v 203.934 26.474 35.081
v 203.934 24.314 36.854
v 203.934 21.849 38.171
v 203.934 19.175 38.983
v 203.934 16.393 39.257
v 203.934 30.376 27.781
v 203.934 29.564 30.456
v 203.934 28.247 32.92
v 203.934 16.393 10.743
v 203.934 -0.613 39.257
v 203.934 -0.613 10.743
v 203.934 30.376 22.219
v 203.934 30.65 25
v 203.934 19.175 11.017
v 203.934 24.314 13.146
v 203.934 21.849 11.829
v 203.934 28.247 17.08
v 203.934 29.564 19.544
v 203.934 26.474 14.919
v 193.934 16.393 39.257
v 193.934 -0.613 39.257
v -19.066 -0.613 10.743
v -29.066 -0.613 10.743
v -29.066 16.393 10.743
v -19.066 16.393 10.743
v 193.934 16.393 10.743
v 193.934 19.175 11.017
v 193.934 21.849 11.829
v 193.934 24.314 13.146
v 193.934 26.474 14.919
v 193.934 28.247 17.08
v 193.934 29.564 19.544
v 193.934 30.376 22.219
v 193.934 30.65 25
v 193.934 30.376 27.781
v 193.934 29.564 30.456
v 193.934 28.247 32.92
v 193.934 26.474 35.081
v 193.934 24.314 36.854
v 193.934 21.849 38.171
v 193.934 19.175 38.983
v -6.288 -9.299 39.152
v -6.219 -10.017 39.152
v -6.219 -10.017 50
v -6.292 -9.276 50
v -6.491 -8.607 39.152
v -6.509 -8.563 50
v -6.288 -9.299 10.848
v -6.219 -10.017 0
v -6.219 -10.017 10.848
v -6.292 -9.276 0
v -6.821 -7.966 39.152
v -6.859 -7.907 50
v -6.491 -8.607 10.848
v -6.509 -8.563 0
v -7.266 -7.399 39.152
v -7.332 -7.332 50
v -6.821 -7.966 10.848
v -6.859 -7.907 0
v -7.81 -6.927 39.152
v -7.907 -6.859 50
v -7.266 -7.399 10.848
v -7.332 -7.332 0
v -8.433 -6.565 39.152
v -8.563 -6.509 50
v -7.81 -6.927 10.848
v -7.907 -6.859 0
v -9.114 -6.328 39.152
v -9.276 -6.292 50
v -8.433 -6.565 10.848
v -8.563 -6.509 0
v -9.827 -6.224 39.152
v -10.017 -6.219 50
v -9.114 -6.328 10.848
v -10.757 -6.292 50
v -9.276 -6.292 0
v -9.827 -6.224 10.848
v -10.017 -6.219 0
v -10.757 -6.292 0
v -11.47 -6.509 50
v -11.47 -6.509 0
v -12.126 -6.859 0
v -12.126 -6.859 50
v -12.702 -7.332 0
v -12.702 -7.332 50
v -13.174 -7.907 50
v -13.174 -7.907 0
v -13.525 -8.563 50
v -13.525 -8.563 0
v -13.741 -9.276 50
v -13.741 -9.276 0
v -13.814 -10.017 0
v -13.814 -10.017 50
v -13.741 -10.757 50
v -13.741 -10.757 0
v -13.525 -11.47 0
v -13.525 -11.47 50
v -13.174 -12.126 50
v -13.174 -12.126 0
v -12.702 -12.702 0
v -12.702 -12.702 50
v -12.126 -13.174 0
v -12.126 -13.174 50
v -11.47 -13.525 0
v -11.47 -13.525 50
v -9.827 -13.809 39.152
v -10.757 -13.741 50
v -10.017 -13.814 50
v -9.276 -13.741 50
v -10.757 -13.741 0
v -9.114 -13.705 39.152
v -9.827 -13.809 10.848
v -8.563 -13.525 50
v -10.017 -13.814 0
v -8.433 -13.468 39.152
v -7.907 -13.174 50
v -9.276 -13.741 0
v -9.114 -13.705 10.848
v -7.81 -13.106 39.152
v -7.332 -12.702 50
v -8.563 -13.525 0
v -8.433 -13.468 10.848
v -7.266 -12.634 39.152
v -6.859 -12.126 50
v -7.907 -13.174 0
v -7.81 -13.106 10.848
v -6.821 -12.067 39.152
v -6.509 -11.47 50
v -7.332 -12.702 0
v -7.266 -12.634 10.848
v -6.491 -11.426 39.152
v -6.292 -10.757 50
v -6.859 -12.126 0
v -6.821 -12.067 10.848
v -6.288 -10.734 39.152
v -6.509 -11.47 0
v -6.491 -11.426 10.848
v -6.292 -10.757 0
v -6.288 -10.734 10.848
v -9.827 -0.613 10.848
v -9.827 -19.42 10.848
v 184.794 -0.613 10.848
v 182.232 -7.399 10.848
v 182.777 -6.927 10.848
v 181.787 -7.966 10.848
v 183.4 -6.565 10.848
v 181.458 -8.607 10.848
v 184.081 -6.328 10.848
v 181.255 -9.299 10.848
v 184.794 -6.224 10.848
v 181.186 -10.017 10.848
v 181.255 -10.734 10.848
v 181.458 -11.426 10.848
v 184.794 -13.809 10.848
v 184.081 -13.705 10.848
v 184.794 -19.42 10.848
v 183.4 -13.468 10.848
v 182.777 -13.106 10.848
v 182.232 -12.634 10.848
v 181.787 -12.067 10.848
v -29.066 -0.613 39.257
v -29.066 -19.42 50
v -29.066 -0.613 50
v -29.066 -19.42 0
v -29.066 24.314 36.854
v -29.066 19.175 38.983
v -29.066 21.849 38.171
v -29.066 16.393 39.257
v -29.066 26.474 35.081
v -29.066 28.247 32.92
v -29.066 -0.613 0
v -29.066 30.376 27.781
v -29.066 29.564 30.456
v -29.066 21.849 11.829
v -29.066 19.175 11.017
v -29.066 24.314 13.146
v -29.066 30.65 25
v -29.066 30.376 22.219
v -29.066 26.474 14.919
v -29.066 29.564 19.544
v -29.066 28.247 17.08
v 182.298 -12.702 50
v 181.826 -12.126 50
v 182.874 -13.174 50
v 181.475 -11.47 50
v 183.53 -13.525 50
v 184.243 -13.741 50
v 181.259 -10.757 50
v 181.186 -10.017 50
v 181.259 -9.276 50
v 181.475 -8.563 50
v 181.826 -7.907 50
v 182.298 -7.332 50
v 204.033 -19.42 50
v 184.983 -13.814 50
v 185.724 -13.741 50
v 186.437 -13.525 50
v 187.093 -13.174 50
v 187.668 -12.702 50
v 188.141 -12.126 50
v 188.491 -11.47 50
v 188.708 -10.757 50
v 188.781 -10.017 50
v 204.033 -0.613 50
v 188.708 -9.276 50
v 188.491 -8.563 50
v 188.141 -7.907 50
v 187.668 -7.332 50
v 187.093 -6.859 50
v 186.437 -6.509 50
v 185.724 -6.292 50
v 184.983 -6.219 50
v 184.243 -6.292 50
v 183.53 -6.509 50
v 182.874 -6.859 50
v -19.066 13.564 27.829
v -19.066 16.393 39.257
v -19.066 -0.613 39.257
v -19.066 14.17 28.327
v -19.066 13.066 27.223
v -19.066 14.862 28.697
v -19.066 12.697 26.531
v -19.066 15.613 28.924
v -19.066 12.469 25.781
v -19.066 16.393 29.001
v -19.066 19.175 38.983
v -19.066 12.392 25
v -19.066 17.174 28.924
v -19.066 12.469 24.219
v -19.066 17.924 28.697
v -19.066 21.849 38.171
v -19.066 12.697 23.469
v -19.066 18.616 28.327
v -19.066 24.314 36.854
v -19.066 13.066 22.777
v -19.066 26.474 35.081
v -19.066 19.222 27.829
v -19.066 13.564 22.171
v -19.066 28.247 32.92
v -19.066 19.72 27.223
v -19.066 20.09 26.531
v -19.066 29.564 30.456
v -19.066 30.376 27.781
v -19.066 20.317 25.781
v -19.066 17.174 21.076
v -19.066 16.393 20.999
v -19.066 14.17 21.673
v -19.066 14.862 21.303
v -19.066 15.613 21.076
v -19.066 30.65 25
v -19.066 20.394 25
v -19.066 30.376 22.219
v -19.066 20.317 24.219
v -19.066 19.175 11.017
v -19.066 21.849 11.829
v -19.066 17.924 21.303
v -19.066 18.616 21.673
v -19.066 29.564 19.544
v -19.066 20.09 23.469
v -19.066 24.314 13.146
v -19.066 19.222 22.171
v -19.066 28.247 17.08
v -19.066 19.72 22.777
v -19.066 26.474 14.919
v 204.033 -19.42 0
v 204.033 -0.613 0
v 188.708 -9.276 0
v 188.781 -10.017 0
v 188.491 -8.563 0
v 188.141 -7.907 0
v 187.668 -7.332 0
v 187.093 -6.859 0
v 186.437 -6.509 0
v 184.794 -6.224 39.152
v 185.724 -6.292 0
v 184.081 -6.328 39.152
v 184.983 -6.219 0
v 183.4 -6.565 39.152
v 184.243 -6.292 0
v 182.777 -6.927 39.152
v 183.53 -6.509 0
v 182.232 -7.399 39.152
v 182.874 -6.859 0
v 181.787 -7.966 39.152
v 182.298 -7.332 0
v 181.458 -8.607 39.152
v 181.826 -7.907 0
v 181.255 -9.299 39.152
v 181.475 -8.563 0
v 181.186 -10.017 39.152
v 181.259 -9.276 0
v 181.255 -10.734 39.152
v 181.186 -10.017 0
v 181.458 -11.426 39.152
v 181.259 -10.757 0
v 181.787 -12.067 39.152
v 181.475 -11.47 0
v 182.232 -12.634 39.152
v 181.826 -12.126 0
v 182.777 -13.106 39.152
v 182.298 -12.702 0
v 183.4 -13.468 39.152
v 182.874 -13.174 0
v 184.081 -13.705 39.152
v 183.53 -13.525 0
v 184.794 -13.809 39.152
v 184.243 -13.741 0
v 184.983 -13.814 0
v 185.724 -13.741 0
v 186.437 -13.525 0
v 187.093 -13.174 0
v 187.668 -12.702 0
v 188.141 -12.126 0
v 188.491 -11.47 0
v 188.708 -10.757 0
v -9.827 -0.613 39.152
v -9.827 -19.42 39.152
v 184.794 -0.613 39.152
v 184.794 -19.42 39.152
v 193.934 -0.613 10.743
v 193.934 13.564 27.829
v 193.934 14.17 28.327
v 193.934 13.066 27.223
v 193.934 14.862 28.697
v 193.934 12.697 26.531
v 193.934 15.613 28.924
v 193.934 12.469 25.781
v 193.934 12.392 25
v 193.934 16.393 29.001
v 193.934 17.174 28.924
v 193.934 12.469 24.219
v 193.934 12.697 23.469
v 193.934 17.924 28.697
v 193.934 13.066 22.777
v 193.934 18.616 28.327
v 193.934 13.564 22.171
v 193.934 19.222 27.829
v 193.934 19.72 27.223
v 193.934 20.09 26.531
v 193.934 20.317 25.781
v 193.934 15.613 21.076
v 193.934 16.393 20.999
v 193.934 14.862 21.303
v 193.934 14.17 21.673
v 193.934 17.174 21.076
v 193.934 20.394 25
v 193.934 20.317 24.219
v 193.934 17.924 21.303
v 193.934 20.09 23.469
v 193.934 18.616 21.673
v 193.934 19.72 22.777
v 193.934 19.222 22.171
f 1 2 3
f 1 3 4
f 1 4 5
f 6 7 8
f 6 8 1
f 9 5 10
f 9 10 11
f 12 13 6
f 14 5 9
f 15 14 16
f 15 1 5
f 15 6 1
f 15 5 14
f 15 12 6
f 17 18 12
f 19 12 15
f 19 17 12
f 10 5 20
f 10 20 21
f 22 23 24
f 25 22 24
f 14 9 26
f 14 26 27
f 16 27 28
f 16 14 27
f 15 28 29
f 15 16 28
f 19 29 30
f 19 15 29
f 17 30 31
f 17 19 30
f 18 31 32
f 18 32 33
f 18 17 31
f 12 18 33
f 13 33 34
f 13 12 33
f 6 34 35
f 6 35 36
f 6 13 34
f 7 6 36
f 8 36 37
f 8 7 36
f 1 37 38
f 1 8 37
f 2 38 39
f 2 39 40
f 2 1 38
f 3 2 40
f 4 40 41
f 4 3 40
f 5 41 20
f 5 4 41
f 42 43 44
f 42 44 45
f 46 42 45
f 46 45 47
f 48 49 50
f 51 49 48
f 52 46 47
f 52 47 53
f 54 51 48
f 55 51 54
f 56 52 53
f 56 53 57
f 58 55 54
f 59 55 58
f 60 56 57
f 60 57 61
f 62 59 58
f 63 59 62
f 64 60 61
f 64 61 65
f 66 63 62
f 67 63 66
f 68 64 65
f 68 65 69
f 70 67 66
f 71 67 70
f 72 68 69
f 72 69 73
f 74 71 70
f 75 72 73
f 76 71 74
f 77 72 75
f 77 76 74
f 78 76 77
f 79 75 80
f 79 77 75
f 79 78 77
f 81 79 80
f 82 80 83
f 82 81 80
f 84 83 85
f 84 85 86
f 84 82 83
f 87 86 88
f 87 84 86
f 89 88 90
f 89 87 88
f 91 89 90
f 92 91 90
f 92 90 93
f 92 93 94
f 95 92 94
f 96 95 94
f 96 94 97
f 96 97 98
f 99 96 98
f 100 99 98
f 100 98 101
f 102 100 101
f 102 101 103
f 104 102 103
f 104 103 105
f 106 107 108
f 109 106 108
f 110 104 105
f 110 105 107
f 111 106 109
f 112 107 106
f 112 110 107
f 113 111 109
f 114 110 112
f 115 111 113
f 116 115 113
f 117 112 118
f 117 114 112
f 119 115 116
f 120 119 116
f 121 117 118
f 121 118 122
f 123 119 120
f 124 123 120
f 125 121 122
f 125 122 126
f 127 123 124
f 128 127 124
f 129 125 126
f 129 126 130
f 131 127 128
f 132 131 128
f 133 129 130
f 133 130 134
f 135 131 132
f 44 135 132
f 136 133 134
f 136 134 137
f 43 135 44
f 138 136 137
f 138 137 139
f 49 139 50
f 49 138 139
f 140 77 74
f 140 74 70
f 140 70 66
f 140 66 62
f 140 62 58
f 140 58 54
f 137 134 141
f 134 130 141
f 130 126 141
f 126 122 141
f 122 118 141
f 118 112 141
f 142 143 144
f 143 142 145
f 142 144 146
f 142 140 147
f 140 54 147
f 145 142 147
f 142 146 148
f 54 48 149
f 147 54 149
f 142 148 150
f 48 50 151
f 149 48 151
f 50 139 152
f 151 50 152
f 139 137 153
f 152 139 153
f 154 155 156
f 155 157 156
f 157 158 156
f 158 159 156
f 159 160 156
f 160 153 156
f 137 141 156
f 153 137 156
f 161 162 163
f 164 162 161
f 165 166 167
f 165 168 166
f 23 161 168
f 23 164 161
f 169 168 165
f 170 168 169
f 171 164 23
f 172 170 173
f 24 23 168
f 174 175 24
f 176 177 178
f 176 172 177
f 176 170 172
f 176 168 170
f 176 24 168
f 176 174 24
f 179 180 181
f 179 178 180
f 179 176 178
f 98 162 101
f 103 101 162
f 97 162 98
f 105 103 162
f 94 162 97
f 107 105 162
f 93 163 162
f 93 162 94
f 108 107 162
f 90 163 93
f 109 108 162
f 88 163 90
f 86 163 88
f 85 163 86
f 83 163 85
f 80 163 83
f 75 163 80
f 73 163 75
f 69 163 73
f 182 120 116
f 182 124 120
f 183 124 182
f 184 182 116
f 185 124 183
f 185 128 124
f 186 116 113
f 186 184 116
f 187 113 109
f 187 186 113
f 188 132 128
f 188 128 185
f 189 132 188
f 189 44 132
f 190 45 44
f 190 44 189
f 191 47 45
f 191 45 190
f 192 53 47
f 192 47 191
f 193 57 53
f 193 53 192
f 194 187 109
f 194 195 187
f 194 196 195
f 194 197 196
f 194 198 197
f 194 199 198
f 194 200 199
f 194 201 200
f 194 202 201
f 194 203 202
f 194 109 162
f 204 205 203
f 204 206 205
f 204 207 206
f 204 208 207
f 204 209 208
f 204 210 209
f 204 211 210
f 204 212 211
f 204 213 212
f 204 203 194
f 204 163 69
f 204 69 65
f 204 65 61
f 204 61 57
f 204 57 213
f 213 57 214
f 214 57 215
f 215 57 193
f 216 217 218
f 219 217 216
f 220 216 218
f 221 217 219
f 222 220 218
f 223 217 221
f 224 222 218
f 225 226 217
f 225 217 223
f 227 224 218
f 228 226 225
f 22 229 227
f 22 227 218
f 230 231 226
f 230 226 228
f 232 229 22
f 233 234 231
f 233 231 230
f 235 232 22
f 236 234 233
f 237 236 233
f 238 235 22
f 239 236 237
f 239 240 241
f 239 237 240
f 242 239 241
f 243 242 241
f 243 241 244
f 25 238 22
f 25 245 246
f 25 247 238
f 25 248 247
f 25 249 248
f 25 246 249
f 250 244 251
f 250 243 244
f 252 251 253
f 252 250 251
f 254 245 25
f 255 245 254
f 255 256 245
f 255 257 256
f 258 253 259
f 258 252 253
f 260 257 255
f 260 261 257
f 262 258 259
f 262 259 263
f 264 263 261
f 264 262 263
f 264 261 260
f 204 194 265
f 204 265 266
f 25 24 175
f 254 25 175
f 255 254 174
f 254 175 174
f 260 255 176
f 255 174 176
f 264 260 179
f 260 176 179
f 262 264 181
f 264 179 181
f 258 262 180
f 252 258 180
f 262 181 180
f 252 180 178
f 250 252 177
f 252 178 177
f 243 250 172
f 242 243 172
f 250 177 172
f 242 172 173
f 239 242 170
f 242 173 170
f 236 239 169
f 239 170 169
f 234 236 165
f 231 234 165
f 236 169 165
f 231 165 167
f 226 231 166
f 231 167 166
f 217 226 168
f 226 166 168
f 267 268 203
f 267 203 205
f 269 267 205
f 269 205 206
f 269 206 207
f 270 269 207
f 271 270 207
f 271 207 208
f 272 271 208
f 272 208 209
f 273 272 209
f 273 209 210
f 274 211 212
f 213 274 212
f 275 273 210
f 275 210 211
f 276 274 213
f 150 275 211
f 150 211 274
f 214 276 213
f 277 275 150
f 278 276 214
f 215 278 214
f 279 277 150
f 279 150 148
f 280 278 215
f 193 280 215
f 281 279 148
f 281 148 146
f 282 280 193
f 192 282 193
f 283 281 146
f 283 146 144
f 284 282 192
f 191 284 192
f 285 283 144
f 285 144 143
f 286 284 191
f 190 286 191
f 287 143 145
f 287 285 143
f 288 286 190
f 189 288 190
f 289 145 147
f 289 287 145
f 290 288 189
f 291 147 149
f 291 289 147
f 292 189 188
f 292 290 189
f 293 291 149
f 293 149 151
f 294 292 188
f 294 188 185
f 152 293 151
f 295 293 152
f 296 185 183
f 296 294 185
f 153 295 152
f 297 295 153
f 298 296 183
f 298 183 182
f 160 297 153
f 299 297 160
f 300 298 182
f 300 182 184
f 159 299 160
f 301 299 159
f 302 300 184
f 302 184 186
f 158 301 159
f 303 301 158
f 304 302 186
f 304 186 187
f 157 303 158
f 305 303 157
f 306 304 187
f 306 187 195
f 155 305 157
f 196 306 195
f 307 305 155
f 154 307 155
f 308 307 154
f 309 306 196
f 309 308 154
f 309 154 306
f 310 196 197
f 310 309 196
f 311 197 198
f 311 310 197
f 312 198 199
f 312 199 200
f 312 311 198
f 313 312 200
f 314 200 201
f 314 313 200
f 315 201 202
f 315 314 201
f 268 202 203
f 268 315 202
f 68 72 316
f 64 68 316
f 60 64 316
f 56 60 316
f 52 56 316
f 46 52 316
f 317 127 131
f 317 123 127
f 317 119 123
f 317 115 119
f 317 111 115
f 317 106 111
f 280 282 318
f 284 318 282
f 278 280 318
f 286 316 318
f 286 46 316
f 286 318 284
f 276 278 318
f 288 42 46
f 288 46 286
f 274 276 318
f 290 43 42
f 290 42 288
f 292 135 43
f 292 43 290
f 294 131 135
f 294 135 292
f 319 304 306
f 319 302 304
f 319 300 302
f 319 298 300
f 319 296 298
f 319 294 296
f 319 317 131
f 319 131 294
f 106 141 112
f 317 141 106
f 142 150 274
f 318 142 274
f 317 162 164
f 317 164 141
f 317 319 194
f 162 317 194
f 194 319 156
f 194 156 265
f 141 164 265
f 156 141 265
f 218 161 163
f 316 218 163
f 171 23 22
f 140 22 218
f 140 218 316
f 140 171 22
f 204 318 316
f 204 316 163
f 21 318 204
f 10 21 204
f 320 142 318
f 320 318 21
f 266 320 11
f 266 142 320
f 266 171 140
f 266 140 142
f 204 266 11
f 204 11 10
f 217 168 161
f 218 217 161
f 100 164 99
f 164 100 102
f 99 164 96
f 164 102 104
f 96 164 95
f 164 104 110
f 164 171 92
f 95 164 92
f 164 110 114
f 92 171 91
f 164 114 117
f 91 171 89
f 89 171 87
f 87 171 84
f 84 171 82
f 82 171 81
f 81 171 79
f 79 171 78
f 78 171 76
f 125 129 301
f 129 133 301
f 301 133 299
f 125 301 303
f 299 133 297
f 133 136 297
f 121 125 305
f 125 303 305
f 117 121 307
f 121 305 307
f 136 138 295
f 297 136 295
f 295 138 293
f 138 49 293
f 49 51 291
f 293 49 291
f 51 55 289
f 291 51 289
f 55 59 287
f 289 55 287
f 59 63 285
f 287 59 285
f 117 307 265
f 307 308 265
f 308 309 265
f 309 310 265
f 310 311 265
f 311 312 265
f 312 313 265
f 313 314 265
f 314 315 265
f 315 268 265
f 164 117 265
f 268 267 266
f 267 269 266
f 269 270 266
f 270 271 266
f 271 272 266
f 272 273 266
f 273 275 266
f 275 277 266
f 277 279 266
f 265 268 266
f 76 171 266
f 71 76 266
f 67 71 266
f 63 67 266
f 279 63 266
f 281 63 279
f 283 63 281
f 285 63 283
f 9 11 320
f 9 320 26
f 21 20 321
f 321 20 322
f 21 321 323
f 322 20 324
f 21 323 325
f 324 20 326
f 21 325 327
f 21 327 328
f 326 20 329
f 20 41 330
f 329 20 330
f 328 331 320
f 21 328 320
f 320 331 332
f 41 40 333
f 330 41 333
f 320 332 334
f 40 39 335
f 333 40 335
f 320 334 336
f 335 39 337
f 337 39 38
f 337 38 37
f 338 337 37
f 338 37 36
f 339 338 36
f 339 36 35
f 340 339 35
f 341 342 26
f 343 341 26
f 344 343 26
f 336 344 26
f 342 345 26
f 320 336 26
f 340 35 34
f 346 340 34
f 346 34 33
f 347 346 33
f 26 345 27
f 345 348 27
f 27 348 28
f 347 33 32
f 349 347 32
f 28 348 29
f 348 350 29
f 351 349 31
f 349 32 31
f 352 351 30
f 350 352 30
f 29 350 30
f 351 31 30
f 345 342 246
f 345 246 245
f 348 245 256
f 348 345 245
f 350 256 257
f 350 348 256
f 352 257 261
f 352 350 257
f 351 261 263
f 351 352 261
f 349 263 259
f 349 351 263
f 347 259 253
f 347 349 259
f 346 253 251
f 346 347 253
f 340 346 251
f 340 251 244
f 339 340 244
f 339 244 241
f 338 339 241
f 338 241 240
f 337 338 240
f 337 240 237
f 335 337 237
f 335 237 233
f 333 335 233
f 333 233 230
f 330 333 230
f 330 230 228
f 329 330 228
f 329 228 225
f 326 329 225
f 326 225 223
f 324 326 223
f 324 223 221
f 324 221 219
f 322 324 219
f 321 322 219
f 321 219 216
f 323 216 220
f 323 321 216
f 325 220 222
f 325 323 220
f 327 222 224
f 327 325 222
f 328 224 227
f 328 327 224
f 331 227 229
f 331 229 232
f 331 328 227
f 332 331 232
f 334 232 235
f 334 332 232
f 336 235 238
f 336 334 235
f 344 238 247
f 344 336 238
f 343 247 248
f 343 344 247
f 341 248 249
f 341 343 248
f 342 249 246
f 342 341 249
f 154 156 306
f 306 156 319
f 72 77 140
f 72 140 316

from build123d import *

# Parameters (mm, degrees)
SKETCH1_W           = 233.09940225
SKETCH1_H           = 18.807132604
SKETCH1_R           = 3.7970867
BOSS_EXTRUDE1_DEPTH = 50
SKETCH3_R           = 4.00110176
BOSS_EXTRUDE2_DEPTH = 10
BOSS_EXTRUDE5_START = -223
SKETCH3_2_R         = 4.00110176
BOSS_EXTRUDE5_DEPTH = 10
BOSS_EXTRUDE6_START = -233
SKETCH4_R           = 4.00110176
BOSS_EXTRUDE6_DEPTH = 233
CUT_EXTRUDE1_REACH  = 217.955
SKETCH5_W           = 194.621538706
SKETCH5_H           = 28.304823728


with BuildPart() as part:
    # Sketch1 → Boss-Extrude1 (new body)
    with BuildSketch(Plane.XY):
        with Locations((87.483442541, -10.016557459)):
            Rectangle(SKETCH1_W, SKETCH1_H)
        with Locations((-10.016557459, -10.016557459)):
            Circle(SKETCH1_R, mode=Mode.SUBTRACT)
        with Locations((184.983442541, -10.016557459)):
            Circle(SKETCH1_R, mode=Mode.SUBTRACT)
    extrude(amount=BOSS_EXTRUDE1_DEPTH)

    # Sketch3 → Boss-Extrude2 (add)
    with BuildSketch(Plane.ZY.offset(29.066258584)):
        with BuildLine():
            Line((10.743495107, -0.612991157), (10.743495107, 16.393198277))
            ThreePointArc((10.743495107, 16.393198277), (25, 30.64970317), (39.256504893, 16.393198277))
            Line((39.256504893, 16.393198277), (39.256504893, -0.612991157))
            Line((39.256504893, -0.612991157), (10.743495107, -0.612991157))
        make_face()
        with Locations((25, 16.393198277)):
            Circle(SKETCH3_R, mode=Mode.SUBTRACT)
    extrude(amount=-BOSS_EXTRUDE2_DEPTH)

    # Sketch3<2> → Boss-Extrude5 (add)
    with BuildSketch(Plane.ZY.offset(29.066258584).offset(BOSS_EXTRUDE5_START)):
        with BuildLine():
            Line((10.743495107, -0.612991157), (10.743495107, 16.393198277))
            ThreePointArc((10.743495107, 16.393198277), (25, 30.64970317), (39.256504893, 16.393198277))
            Line((39.256504893, 16.393198277), (39.256504893, -0.612991157))
            Line((39.256504893, -0.612991157), (10.743495107, -0.612991157))
        make_face()
        with Locations((25, 16.393198277)):
            Circle(SKETCH3_2_R, mode=Mode.SUBTRACT)
    extrude(amount=-BOSS_EXTRUDE5_DEPTH)

    # Sketch4 → Boss-Extrude6 (add)
    with BuildSketch(Plane(origin=(203.933741416, 0, 0), x_dir=(0, 0, -1), z_dir=(1, 0, 0)).offset(BOSS_EXTRUDE6_START)):
        with Locations((-25, 16.393198277)):
            Circle(SKETCH4_R)
    extrude(amount=BOSS_EXTRUDE6_DEPTH)

    # Sketch5 → Cut-Extrude1 (cut, up to next)
    with BuildSketch(Plane.XZ.offset(19.420123761), mode=Mode.PRIVATE) as cut_extrude1_sk1:
        with Locations((87.483442541, 25)):
            Rectangle(SKETCH5_W, SKETCH5_H)
    cut_extrude1_tool1 = extrude(cut_extrude1_sk1.sketch, amount=-CUT_EXTRUDE1_REACH, mode=Mode.PRIVATE) & part.part
    add(cut_extrude1_tool1.solids().sort_by_distance((87.483443, -19.420124, 25))[0], mode=Mode.SUBTRACT)


solid = part.part
